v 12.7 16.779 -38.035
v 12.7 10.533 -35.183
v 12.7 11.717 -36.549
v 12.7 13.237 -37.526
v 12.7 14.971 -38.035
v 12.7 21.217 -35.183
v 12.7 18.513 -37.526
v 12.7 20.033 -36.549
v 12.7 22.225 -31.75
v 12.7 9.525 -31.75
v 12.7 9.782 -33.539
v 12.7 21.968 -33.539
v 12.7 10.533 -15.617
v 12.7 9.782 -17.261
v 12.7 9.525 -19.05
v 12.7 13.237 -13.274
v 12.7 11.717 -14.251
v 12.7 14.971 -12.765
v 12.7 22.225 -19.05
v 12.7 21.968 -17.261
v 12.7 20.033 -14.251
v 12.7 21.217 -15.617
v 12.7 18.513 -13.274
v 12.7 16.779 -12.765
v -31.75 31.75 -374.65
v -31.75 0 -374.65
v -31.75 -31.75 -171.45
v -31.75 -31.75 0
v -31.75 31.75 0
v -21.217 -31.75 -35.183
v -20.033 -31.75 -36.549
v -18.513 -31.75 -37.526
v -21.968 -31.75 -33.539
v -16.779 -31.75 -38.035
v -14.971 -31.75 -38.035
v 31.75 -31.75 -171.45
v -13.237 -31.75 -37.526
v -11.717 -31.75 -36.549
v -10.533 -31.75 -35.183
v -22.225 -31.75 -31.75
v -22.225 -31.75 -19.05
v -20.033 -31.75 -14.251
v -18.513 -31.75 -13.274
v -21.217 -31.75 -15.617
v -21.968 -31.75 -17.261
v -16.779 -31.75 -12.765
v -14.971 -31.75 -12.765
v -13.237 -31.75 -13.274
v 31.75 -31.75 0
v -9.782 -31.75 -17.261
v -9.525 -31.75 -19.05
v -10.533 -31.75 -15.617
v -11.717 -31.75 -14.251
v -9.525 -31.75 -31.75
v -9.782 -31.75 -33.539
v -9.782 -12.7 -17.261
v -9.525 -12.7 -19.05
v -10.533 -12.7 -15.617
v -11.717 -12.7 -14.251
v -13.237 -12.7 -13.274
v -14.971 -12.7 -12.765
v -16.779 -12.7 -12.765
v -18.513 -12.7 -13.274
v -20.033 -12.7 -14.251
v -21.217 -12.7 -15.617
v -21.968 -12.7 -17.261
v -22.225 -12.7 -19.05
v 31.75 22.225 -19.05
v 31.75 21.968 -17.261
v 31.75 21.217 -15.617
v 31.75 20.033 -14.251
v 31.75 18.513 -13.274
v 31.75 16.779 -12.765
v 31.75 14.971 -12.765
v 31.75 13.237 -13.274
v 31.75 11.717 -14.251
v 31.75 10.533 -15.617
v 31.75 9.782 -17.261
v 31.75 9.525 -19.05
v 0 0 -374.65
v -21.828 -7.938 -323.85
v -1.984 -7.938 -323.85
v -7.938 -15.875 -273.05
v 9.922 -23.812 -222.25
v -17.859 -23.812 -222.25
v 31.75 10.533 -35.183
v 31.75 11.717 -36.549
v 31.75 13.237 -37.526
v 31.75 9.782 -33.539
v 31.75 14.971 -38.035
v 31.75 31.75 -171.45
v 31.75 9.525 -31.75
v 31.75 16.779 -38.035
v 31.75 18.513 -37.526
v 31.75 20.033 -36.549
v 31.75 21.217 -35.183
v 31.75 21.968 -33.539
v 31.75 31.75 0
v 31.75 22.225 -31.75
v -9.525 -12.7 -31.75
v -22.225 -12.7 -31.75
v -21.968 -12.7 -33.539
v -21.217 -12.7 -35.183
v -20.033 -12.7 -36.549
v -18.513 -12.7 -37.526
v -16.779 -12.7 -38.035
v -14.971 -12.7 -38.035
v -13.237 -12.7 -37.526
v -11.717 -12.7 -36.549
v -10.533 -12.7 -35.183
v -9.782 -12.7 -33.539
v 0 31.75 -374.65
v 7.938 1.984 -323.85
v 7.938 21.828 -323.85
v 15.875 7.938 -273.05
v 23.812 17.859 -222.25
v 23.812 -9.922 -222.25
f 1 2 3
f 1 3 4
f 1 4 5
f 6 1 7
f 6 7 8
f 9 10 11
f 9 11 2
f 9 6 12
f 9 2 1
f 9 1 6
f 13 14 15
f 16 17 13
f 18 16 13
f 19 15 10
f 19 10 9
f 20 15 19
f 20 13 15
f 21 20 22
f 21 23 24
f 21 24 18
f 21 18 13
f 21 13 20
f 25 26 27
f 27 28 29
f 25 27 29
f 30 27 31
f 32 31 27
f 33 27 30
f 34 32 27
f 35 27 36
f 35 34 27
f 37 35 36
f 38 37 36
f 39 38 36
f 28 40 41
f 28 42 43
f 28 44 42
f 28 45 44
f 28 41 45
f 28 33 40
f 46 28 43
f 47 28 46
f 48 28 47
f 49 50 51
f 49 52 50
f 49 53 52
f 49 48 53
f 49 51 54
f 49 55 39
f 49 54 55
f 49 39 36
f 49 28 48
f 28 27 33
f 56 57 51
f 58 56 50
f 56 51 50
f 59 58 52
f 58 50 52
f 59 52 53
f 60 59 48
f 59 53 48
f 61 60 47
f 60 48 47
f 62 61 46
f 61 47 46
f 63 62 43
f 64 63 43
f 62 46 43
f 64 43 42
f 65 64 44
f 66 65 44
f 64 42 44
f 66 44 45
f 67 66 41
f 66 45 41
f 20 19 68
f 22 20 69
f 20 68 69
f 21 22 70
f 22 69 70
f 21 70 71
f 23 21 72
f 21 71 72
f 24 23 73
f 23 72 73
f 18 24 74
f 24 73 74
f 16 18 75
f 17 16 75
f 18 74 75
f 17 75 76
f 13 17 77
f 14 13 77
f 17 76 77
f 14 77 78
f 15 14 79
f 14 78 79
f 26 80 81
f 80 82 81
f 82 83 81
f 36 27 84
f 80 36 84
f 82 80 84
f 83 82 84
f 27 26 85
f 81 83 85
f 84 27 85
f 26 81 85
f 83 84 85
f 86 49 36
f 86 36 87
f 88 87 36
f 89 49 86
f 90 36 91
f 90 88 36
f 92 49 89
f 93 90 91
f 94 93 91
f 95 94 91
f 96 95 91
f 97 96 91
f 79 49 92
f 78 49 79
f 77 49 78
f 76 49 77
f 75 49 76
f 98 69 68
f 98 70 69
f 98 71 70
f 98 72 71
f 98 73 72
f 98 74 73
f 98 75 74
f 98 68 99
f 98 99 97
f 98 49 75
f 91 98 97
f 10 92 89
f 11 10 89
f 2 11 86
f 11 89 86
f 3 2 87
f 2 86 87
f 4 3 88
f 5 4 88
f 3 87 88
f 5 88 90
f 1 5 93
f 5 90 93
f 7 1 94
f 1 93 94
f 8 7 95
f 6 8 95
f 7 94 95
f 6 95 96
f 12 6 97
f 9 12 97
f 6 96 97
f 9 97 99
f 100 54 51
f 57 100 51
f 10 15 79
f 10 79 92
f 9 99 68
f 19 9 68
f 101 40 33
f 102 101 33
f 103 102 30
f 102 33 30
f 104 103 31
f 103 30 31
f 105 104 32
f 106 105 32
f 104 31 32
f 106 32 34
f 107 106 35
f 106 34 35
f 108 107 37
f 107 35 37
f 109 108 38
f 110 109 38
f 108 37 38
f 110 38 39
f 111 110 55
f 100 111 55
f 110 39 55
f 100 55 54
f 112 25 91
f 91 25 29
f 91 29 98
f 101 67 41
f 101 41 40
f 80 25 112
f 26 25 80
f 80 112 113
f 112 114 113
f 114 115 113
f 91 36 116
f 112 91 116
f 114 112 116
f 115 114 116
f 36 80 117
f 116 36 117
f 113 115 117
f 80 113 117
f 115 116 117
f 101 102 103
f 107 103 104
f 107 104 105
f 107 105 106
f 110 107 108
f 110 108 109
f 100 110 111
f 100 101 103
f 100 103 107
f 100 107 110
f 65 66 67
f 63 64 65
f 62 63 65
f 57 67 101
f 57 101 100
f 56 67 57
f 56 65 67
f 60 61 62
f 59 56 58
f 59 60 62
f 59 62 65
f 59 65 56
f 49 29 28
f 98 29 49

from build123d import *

# Parameters (mm, degrees)
F0_W      = 63.5
F0_H      = 63.5
F1_DEPTH  = 171.45
F3_W      = 31.75
F3_H      = 31.75
F1_FACE_W = 63.5
F1_FACE_H = 63.5
F6_DEPTH  = 19.05
F8_DEPTH  = 19.05


with BuildPart() as f1:
    # F0 (on Top) → F1 (new body)
    with BuildSketch(Plane.XY):
        Rectangle(F0_W, F0_H)
    extrude(amount=-F1_DEPTH)

    # F3 (on offset) → F4 section 0
    with BuildSketch(Plane(origin=(0, 0, -374.65), x_dir=(1, 0, 0), z_dir=(0, 0, -1))):
        with Locations((-15.875, -15.875)):
            Rectangle(F3_W, F3_H)
    # F1_face (on face) → F4 section 1
    with BuildSketch(Plane(origin=(0, 0, -171.45), x_dir=(1, 0, 0), z_dir=(0, 0, -1))):
        Rectangle(F1_FACE_W, F1_FACE_H)
    loft()

    # F5 (on face) → F6 (cut)
    with BuildSketch(Plane.XZ.offset(31.75)):
        with BuildLine():
            Line((-22.225, -19.05), (-22.225, -31.75))
            ThreePointArc((-22.225, -31.75), (-15.875, -38.1), (-9.525, -31.75))
            Line((-9.525, -31.75), (-9.525, -19.05))
            ThreePointArc((-9.525, -19.05), (-15.875, -12.7), (-22.225, -19.05))
        make_face()
    extrude(amount=-F6_DEPTH, mode=Mode.SUBTRACT)

    # F7 (on face) → F8 (cut)
    with BuildSketch(Plane.YZ.offset(31.75)):
        with BuildLine():
            Line((9.525, -19.05), (9.525, -31.75))
            ThreePointArc((9.525, -31.75), (15.875, -38.1), (22.225, -31.75))
            Line((22.225, -31.75), (22.225, -19.05))
            ThreePointArc((22.225, -19.05), (15.875, -12.7), (9.525, -19.05))
        make_face()
    extrude(amount=-F8_DEPTH, mode=Mode.SUBTRACT)


solid = f1.part
